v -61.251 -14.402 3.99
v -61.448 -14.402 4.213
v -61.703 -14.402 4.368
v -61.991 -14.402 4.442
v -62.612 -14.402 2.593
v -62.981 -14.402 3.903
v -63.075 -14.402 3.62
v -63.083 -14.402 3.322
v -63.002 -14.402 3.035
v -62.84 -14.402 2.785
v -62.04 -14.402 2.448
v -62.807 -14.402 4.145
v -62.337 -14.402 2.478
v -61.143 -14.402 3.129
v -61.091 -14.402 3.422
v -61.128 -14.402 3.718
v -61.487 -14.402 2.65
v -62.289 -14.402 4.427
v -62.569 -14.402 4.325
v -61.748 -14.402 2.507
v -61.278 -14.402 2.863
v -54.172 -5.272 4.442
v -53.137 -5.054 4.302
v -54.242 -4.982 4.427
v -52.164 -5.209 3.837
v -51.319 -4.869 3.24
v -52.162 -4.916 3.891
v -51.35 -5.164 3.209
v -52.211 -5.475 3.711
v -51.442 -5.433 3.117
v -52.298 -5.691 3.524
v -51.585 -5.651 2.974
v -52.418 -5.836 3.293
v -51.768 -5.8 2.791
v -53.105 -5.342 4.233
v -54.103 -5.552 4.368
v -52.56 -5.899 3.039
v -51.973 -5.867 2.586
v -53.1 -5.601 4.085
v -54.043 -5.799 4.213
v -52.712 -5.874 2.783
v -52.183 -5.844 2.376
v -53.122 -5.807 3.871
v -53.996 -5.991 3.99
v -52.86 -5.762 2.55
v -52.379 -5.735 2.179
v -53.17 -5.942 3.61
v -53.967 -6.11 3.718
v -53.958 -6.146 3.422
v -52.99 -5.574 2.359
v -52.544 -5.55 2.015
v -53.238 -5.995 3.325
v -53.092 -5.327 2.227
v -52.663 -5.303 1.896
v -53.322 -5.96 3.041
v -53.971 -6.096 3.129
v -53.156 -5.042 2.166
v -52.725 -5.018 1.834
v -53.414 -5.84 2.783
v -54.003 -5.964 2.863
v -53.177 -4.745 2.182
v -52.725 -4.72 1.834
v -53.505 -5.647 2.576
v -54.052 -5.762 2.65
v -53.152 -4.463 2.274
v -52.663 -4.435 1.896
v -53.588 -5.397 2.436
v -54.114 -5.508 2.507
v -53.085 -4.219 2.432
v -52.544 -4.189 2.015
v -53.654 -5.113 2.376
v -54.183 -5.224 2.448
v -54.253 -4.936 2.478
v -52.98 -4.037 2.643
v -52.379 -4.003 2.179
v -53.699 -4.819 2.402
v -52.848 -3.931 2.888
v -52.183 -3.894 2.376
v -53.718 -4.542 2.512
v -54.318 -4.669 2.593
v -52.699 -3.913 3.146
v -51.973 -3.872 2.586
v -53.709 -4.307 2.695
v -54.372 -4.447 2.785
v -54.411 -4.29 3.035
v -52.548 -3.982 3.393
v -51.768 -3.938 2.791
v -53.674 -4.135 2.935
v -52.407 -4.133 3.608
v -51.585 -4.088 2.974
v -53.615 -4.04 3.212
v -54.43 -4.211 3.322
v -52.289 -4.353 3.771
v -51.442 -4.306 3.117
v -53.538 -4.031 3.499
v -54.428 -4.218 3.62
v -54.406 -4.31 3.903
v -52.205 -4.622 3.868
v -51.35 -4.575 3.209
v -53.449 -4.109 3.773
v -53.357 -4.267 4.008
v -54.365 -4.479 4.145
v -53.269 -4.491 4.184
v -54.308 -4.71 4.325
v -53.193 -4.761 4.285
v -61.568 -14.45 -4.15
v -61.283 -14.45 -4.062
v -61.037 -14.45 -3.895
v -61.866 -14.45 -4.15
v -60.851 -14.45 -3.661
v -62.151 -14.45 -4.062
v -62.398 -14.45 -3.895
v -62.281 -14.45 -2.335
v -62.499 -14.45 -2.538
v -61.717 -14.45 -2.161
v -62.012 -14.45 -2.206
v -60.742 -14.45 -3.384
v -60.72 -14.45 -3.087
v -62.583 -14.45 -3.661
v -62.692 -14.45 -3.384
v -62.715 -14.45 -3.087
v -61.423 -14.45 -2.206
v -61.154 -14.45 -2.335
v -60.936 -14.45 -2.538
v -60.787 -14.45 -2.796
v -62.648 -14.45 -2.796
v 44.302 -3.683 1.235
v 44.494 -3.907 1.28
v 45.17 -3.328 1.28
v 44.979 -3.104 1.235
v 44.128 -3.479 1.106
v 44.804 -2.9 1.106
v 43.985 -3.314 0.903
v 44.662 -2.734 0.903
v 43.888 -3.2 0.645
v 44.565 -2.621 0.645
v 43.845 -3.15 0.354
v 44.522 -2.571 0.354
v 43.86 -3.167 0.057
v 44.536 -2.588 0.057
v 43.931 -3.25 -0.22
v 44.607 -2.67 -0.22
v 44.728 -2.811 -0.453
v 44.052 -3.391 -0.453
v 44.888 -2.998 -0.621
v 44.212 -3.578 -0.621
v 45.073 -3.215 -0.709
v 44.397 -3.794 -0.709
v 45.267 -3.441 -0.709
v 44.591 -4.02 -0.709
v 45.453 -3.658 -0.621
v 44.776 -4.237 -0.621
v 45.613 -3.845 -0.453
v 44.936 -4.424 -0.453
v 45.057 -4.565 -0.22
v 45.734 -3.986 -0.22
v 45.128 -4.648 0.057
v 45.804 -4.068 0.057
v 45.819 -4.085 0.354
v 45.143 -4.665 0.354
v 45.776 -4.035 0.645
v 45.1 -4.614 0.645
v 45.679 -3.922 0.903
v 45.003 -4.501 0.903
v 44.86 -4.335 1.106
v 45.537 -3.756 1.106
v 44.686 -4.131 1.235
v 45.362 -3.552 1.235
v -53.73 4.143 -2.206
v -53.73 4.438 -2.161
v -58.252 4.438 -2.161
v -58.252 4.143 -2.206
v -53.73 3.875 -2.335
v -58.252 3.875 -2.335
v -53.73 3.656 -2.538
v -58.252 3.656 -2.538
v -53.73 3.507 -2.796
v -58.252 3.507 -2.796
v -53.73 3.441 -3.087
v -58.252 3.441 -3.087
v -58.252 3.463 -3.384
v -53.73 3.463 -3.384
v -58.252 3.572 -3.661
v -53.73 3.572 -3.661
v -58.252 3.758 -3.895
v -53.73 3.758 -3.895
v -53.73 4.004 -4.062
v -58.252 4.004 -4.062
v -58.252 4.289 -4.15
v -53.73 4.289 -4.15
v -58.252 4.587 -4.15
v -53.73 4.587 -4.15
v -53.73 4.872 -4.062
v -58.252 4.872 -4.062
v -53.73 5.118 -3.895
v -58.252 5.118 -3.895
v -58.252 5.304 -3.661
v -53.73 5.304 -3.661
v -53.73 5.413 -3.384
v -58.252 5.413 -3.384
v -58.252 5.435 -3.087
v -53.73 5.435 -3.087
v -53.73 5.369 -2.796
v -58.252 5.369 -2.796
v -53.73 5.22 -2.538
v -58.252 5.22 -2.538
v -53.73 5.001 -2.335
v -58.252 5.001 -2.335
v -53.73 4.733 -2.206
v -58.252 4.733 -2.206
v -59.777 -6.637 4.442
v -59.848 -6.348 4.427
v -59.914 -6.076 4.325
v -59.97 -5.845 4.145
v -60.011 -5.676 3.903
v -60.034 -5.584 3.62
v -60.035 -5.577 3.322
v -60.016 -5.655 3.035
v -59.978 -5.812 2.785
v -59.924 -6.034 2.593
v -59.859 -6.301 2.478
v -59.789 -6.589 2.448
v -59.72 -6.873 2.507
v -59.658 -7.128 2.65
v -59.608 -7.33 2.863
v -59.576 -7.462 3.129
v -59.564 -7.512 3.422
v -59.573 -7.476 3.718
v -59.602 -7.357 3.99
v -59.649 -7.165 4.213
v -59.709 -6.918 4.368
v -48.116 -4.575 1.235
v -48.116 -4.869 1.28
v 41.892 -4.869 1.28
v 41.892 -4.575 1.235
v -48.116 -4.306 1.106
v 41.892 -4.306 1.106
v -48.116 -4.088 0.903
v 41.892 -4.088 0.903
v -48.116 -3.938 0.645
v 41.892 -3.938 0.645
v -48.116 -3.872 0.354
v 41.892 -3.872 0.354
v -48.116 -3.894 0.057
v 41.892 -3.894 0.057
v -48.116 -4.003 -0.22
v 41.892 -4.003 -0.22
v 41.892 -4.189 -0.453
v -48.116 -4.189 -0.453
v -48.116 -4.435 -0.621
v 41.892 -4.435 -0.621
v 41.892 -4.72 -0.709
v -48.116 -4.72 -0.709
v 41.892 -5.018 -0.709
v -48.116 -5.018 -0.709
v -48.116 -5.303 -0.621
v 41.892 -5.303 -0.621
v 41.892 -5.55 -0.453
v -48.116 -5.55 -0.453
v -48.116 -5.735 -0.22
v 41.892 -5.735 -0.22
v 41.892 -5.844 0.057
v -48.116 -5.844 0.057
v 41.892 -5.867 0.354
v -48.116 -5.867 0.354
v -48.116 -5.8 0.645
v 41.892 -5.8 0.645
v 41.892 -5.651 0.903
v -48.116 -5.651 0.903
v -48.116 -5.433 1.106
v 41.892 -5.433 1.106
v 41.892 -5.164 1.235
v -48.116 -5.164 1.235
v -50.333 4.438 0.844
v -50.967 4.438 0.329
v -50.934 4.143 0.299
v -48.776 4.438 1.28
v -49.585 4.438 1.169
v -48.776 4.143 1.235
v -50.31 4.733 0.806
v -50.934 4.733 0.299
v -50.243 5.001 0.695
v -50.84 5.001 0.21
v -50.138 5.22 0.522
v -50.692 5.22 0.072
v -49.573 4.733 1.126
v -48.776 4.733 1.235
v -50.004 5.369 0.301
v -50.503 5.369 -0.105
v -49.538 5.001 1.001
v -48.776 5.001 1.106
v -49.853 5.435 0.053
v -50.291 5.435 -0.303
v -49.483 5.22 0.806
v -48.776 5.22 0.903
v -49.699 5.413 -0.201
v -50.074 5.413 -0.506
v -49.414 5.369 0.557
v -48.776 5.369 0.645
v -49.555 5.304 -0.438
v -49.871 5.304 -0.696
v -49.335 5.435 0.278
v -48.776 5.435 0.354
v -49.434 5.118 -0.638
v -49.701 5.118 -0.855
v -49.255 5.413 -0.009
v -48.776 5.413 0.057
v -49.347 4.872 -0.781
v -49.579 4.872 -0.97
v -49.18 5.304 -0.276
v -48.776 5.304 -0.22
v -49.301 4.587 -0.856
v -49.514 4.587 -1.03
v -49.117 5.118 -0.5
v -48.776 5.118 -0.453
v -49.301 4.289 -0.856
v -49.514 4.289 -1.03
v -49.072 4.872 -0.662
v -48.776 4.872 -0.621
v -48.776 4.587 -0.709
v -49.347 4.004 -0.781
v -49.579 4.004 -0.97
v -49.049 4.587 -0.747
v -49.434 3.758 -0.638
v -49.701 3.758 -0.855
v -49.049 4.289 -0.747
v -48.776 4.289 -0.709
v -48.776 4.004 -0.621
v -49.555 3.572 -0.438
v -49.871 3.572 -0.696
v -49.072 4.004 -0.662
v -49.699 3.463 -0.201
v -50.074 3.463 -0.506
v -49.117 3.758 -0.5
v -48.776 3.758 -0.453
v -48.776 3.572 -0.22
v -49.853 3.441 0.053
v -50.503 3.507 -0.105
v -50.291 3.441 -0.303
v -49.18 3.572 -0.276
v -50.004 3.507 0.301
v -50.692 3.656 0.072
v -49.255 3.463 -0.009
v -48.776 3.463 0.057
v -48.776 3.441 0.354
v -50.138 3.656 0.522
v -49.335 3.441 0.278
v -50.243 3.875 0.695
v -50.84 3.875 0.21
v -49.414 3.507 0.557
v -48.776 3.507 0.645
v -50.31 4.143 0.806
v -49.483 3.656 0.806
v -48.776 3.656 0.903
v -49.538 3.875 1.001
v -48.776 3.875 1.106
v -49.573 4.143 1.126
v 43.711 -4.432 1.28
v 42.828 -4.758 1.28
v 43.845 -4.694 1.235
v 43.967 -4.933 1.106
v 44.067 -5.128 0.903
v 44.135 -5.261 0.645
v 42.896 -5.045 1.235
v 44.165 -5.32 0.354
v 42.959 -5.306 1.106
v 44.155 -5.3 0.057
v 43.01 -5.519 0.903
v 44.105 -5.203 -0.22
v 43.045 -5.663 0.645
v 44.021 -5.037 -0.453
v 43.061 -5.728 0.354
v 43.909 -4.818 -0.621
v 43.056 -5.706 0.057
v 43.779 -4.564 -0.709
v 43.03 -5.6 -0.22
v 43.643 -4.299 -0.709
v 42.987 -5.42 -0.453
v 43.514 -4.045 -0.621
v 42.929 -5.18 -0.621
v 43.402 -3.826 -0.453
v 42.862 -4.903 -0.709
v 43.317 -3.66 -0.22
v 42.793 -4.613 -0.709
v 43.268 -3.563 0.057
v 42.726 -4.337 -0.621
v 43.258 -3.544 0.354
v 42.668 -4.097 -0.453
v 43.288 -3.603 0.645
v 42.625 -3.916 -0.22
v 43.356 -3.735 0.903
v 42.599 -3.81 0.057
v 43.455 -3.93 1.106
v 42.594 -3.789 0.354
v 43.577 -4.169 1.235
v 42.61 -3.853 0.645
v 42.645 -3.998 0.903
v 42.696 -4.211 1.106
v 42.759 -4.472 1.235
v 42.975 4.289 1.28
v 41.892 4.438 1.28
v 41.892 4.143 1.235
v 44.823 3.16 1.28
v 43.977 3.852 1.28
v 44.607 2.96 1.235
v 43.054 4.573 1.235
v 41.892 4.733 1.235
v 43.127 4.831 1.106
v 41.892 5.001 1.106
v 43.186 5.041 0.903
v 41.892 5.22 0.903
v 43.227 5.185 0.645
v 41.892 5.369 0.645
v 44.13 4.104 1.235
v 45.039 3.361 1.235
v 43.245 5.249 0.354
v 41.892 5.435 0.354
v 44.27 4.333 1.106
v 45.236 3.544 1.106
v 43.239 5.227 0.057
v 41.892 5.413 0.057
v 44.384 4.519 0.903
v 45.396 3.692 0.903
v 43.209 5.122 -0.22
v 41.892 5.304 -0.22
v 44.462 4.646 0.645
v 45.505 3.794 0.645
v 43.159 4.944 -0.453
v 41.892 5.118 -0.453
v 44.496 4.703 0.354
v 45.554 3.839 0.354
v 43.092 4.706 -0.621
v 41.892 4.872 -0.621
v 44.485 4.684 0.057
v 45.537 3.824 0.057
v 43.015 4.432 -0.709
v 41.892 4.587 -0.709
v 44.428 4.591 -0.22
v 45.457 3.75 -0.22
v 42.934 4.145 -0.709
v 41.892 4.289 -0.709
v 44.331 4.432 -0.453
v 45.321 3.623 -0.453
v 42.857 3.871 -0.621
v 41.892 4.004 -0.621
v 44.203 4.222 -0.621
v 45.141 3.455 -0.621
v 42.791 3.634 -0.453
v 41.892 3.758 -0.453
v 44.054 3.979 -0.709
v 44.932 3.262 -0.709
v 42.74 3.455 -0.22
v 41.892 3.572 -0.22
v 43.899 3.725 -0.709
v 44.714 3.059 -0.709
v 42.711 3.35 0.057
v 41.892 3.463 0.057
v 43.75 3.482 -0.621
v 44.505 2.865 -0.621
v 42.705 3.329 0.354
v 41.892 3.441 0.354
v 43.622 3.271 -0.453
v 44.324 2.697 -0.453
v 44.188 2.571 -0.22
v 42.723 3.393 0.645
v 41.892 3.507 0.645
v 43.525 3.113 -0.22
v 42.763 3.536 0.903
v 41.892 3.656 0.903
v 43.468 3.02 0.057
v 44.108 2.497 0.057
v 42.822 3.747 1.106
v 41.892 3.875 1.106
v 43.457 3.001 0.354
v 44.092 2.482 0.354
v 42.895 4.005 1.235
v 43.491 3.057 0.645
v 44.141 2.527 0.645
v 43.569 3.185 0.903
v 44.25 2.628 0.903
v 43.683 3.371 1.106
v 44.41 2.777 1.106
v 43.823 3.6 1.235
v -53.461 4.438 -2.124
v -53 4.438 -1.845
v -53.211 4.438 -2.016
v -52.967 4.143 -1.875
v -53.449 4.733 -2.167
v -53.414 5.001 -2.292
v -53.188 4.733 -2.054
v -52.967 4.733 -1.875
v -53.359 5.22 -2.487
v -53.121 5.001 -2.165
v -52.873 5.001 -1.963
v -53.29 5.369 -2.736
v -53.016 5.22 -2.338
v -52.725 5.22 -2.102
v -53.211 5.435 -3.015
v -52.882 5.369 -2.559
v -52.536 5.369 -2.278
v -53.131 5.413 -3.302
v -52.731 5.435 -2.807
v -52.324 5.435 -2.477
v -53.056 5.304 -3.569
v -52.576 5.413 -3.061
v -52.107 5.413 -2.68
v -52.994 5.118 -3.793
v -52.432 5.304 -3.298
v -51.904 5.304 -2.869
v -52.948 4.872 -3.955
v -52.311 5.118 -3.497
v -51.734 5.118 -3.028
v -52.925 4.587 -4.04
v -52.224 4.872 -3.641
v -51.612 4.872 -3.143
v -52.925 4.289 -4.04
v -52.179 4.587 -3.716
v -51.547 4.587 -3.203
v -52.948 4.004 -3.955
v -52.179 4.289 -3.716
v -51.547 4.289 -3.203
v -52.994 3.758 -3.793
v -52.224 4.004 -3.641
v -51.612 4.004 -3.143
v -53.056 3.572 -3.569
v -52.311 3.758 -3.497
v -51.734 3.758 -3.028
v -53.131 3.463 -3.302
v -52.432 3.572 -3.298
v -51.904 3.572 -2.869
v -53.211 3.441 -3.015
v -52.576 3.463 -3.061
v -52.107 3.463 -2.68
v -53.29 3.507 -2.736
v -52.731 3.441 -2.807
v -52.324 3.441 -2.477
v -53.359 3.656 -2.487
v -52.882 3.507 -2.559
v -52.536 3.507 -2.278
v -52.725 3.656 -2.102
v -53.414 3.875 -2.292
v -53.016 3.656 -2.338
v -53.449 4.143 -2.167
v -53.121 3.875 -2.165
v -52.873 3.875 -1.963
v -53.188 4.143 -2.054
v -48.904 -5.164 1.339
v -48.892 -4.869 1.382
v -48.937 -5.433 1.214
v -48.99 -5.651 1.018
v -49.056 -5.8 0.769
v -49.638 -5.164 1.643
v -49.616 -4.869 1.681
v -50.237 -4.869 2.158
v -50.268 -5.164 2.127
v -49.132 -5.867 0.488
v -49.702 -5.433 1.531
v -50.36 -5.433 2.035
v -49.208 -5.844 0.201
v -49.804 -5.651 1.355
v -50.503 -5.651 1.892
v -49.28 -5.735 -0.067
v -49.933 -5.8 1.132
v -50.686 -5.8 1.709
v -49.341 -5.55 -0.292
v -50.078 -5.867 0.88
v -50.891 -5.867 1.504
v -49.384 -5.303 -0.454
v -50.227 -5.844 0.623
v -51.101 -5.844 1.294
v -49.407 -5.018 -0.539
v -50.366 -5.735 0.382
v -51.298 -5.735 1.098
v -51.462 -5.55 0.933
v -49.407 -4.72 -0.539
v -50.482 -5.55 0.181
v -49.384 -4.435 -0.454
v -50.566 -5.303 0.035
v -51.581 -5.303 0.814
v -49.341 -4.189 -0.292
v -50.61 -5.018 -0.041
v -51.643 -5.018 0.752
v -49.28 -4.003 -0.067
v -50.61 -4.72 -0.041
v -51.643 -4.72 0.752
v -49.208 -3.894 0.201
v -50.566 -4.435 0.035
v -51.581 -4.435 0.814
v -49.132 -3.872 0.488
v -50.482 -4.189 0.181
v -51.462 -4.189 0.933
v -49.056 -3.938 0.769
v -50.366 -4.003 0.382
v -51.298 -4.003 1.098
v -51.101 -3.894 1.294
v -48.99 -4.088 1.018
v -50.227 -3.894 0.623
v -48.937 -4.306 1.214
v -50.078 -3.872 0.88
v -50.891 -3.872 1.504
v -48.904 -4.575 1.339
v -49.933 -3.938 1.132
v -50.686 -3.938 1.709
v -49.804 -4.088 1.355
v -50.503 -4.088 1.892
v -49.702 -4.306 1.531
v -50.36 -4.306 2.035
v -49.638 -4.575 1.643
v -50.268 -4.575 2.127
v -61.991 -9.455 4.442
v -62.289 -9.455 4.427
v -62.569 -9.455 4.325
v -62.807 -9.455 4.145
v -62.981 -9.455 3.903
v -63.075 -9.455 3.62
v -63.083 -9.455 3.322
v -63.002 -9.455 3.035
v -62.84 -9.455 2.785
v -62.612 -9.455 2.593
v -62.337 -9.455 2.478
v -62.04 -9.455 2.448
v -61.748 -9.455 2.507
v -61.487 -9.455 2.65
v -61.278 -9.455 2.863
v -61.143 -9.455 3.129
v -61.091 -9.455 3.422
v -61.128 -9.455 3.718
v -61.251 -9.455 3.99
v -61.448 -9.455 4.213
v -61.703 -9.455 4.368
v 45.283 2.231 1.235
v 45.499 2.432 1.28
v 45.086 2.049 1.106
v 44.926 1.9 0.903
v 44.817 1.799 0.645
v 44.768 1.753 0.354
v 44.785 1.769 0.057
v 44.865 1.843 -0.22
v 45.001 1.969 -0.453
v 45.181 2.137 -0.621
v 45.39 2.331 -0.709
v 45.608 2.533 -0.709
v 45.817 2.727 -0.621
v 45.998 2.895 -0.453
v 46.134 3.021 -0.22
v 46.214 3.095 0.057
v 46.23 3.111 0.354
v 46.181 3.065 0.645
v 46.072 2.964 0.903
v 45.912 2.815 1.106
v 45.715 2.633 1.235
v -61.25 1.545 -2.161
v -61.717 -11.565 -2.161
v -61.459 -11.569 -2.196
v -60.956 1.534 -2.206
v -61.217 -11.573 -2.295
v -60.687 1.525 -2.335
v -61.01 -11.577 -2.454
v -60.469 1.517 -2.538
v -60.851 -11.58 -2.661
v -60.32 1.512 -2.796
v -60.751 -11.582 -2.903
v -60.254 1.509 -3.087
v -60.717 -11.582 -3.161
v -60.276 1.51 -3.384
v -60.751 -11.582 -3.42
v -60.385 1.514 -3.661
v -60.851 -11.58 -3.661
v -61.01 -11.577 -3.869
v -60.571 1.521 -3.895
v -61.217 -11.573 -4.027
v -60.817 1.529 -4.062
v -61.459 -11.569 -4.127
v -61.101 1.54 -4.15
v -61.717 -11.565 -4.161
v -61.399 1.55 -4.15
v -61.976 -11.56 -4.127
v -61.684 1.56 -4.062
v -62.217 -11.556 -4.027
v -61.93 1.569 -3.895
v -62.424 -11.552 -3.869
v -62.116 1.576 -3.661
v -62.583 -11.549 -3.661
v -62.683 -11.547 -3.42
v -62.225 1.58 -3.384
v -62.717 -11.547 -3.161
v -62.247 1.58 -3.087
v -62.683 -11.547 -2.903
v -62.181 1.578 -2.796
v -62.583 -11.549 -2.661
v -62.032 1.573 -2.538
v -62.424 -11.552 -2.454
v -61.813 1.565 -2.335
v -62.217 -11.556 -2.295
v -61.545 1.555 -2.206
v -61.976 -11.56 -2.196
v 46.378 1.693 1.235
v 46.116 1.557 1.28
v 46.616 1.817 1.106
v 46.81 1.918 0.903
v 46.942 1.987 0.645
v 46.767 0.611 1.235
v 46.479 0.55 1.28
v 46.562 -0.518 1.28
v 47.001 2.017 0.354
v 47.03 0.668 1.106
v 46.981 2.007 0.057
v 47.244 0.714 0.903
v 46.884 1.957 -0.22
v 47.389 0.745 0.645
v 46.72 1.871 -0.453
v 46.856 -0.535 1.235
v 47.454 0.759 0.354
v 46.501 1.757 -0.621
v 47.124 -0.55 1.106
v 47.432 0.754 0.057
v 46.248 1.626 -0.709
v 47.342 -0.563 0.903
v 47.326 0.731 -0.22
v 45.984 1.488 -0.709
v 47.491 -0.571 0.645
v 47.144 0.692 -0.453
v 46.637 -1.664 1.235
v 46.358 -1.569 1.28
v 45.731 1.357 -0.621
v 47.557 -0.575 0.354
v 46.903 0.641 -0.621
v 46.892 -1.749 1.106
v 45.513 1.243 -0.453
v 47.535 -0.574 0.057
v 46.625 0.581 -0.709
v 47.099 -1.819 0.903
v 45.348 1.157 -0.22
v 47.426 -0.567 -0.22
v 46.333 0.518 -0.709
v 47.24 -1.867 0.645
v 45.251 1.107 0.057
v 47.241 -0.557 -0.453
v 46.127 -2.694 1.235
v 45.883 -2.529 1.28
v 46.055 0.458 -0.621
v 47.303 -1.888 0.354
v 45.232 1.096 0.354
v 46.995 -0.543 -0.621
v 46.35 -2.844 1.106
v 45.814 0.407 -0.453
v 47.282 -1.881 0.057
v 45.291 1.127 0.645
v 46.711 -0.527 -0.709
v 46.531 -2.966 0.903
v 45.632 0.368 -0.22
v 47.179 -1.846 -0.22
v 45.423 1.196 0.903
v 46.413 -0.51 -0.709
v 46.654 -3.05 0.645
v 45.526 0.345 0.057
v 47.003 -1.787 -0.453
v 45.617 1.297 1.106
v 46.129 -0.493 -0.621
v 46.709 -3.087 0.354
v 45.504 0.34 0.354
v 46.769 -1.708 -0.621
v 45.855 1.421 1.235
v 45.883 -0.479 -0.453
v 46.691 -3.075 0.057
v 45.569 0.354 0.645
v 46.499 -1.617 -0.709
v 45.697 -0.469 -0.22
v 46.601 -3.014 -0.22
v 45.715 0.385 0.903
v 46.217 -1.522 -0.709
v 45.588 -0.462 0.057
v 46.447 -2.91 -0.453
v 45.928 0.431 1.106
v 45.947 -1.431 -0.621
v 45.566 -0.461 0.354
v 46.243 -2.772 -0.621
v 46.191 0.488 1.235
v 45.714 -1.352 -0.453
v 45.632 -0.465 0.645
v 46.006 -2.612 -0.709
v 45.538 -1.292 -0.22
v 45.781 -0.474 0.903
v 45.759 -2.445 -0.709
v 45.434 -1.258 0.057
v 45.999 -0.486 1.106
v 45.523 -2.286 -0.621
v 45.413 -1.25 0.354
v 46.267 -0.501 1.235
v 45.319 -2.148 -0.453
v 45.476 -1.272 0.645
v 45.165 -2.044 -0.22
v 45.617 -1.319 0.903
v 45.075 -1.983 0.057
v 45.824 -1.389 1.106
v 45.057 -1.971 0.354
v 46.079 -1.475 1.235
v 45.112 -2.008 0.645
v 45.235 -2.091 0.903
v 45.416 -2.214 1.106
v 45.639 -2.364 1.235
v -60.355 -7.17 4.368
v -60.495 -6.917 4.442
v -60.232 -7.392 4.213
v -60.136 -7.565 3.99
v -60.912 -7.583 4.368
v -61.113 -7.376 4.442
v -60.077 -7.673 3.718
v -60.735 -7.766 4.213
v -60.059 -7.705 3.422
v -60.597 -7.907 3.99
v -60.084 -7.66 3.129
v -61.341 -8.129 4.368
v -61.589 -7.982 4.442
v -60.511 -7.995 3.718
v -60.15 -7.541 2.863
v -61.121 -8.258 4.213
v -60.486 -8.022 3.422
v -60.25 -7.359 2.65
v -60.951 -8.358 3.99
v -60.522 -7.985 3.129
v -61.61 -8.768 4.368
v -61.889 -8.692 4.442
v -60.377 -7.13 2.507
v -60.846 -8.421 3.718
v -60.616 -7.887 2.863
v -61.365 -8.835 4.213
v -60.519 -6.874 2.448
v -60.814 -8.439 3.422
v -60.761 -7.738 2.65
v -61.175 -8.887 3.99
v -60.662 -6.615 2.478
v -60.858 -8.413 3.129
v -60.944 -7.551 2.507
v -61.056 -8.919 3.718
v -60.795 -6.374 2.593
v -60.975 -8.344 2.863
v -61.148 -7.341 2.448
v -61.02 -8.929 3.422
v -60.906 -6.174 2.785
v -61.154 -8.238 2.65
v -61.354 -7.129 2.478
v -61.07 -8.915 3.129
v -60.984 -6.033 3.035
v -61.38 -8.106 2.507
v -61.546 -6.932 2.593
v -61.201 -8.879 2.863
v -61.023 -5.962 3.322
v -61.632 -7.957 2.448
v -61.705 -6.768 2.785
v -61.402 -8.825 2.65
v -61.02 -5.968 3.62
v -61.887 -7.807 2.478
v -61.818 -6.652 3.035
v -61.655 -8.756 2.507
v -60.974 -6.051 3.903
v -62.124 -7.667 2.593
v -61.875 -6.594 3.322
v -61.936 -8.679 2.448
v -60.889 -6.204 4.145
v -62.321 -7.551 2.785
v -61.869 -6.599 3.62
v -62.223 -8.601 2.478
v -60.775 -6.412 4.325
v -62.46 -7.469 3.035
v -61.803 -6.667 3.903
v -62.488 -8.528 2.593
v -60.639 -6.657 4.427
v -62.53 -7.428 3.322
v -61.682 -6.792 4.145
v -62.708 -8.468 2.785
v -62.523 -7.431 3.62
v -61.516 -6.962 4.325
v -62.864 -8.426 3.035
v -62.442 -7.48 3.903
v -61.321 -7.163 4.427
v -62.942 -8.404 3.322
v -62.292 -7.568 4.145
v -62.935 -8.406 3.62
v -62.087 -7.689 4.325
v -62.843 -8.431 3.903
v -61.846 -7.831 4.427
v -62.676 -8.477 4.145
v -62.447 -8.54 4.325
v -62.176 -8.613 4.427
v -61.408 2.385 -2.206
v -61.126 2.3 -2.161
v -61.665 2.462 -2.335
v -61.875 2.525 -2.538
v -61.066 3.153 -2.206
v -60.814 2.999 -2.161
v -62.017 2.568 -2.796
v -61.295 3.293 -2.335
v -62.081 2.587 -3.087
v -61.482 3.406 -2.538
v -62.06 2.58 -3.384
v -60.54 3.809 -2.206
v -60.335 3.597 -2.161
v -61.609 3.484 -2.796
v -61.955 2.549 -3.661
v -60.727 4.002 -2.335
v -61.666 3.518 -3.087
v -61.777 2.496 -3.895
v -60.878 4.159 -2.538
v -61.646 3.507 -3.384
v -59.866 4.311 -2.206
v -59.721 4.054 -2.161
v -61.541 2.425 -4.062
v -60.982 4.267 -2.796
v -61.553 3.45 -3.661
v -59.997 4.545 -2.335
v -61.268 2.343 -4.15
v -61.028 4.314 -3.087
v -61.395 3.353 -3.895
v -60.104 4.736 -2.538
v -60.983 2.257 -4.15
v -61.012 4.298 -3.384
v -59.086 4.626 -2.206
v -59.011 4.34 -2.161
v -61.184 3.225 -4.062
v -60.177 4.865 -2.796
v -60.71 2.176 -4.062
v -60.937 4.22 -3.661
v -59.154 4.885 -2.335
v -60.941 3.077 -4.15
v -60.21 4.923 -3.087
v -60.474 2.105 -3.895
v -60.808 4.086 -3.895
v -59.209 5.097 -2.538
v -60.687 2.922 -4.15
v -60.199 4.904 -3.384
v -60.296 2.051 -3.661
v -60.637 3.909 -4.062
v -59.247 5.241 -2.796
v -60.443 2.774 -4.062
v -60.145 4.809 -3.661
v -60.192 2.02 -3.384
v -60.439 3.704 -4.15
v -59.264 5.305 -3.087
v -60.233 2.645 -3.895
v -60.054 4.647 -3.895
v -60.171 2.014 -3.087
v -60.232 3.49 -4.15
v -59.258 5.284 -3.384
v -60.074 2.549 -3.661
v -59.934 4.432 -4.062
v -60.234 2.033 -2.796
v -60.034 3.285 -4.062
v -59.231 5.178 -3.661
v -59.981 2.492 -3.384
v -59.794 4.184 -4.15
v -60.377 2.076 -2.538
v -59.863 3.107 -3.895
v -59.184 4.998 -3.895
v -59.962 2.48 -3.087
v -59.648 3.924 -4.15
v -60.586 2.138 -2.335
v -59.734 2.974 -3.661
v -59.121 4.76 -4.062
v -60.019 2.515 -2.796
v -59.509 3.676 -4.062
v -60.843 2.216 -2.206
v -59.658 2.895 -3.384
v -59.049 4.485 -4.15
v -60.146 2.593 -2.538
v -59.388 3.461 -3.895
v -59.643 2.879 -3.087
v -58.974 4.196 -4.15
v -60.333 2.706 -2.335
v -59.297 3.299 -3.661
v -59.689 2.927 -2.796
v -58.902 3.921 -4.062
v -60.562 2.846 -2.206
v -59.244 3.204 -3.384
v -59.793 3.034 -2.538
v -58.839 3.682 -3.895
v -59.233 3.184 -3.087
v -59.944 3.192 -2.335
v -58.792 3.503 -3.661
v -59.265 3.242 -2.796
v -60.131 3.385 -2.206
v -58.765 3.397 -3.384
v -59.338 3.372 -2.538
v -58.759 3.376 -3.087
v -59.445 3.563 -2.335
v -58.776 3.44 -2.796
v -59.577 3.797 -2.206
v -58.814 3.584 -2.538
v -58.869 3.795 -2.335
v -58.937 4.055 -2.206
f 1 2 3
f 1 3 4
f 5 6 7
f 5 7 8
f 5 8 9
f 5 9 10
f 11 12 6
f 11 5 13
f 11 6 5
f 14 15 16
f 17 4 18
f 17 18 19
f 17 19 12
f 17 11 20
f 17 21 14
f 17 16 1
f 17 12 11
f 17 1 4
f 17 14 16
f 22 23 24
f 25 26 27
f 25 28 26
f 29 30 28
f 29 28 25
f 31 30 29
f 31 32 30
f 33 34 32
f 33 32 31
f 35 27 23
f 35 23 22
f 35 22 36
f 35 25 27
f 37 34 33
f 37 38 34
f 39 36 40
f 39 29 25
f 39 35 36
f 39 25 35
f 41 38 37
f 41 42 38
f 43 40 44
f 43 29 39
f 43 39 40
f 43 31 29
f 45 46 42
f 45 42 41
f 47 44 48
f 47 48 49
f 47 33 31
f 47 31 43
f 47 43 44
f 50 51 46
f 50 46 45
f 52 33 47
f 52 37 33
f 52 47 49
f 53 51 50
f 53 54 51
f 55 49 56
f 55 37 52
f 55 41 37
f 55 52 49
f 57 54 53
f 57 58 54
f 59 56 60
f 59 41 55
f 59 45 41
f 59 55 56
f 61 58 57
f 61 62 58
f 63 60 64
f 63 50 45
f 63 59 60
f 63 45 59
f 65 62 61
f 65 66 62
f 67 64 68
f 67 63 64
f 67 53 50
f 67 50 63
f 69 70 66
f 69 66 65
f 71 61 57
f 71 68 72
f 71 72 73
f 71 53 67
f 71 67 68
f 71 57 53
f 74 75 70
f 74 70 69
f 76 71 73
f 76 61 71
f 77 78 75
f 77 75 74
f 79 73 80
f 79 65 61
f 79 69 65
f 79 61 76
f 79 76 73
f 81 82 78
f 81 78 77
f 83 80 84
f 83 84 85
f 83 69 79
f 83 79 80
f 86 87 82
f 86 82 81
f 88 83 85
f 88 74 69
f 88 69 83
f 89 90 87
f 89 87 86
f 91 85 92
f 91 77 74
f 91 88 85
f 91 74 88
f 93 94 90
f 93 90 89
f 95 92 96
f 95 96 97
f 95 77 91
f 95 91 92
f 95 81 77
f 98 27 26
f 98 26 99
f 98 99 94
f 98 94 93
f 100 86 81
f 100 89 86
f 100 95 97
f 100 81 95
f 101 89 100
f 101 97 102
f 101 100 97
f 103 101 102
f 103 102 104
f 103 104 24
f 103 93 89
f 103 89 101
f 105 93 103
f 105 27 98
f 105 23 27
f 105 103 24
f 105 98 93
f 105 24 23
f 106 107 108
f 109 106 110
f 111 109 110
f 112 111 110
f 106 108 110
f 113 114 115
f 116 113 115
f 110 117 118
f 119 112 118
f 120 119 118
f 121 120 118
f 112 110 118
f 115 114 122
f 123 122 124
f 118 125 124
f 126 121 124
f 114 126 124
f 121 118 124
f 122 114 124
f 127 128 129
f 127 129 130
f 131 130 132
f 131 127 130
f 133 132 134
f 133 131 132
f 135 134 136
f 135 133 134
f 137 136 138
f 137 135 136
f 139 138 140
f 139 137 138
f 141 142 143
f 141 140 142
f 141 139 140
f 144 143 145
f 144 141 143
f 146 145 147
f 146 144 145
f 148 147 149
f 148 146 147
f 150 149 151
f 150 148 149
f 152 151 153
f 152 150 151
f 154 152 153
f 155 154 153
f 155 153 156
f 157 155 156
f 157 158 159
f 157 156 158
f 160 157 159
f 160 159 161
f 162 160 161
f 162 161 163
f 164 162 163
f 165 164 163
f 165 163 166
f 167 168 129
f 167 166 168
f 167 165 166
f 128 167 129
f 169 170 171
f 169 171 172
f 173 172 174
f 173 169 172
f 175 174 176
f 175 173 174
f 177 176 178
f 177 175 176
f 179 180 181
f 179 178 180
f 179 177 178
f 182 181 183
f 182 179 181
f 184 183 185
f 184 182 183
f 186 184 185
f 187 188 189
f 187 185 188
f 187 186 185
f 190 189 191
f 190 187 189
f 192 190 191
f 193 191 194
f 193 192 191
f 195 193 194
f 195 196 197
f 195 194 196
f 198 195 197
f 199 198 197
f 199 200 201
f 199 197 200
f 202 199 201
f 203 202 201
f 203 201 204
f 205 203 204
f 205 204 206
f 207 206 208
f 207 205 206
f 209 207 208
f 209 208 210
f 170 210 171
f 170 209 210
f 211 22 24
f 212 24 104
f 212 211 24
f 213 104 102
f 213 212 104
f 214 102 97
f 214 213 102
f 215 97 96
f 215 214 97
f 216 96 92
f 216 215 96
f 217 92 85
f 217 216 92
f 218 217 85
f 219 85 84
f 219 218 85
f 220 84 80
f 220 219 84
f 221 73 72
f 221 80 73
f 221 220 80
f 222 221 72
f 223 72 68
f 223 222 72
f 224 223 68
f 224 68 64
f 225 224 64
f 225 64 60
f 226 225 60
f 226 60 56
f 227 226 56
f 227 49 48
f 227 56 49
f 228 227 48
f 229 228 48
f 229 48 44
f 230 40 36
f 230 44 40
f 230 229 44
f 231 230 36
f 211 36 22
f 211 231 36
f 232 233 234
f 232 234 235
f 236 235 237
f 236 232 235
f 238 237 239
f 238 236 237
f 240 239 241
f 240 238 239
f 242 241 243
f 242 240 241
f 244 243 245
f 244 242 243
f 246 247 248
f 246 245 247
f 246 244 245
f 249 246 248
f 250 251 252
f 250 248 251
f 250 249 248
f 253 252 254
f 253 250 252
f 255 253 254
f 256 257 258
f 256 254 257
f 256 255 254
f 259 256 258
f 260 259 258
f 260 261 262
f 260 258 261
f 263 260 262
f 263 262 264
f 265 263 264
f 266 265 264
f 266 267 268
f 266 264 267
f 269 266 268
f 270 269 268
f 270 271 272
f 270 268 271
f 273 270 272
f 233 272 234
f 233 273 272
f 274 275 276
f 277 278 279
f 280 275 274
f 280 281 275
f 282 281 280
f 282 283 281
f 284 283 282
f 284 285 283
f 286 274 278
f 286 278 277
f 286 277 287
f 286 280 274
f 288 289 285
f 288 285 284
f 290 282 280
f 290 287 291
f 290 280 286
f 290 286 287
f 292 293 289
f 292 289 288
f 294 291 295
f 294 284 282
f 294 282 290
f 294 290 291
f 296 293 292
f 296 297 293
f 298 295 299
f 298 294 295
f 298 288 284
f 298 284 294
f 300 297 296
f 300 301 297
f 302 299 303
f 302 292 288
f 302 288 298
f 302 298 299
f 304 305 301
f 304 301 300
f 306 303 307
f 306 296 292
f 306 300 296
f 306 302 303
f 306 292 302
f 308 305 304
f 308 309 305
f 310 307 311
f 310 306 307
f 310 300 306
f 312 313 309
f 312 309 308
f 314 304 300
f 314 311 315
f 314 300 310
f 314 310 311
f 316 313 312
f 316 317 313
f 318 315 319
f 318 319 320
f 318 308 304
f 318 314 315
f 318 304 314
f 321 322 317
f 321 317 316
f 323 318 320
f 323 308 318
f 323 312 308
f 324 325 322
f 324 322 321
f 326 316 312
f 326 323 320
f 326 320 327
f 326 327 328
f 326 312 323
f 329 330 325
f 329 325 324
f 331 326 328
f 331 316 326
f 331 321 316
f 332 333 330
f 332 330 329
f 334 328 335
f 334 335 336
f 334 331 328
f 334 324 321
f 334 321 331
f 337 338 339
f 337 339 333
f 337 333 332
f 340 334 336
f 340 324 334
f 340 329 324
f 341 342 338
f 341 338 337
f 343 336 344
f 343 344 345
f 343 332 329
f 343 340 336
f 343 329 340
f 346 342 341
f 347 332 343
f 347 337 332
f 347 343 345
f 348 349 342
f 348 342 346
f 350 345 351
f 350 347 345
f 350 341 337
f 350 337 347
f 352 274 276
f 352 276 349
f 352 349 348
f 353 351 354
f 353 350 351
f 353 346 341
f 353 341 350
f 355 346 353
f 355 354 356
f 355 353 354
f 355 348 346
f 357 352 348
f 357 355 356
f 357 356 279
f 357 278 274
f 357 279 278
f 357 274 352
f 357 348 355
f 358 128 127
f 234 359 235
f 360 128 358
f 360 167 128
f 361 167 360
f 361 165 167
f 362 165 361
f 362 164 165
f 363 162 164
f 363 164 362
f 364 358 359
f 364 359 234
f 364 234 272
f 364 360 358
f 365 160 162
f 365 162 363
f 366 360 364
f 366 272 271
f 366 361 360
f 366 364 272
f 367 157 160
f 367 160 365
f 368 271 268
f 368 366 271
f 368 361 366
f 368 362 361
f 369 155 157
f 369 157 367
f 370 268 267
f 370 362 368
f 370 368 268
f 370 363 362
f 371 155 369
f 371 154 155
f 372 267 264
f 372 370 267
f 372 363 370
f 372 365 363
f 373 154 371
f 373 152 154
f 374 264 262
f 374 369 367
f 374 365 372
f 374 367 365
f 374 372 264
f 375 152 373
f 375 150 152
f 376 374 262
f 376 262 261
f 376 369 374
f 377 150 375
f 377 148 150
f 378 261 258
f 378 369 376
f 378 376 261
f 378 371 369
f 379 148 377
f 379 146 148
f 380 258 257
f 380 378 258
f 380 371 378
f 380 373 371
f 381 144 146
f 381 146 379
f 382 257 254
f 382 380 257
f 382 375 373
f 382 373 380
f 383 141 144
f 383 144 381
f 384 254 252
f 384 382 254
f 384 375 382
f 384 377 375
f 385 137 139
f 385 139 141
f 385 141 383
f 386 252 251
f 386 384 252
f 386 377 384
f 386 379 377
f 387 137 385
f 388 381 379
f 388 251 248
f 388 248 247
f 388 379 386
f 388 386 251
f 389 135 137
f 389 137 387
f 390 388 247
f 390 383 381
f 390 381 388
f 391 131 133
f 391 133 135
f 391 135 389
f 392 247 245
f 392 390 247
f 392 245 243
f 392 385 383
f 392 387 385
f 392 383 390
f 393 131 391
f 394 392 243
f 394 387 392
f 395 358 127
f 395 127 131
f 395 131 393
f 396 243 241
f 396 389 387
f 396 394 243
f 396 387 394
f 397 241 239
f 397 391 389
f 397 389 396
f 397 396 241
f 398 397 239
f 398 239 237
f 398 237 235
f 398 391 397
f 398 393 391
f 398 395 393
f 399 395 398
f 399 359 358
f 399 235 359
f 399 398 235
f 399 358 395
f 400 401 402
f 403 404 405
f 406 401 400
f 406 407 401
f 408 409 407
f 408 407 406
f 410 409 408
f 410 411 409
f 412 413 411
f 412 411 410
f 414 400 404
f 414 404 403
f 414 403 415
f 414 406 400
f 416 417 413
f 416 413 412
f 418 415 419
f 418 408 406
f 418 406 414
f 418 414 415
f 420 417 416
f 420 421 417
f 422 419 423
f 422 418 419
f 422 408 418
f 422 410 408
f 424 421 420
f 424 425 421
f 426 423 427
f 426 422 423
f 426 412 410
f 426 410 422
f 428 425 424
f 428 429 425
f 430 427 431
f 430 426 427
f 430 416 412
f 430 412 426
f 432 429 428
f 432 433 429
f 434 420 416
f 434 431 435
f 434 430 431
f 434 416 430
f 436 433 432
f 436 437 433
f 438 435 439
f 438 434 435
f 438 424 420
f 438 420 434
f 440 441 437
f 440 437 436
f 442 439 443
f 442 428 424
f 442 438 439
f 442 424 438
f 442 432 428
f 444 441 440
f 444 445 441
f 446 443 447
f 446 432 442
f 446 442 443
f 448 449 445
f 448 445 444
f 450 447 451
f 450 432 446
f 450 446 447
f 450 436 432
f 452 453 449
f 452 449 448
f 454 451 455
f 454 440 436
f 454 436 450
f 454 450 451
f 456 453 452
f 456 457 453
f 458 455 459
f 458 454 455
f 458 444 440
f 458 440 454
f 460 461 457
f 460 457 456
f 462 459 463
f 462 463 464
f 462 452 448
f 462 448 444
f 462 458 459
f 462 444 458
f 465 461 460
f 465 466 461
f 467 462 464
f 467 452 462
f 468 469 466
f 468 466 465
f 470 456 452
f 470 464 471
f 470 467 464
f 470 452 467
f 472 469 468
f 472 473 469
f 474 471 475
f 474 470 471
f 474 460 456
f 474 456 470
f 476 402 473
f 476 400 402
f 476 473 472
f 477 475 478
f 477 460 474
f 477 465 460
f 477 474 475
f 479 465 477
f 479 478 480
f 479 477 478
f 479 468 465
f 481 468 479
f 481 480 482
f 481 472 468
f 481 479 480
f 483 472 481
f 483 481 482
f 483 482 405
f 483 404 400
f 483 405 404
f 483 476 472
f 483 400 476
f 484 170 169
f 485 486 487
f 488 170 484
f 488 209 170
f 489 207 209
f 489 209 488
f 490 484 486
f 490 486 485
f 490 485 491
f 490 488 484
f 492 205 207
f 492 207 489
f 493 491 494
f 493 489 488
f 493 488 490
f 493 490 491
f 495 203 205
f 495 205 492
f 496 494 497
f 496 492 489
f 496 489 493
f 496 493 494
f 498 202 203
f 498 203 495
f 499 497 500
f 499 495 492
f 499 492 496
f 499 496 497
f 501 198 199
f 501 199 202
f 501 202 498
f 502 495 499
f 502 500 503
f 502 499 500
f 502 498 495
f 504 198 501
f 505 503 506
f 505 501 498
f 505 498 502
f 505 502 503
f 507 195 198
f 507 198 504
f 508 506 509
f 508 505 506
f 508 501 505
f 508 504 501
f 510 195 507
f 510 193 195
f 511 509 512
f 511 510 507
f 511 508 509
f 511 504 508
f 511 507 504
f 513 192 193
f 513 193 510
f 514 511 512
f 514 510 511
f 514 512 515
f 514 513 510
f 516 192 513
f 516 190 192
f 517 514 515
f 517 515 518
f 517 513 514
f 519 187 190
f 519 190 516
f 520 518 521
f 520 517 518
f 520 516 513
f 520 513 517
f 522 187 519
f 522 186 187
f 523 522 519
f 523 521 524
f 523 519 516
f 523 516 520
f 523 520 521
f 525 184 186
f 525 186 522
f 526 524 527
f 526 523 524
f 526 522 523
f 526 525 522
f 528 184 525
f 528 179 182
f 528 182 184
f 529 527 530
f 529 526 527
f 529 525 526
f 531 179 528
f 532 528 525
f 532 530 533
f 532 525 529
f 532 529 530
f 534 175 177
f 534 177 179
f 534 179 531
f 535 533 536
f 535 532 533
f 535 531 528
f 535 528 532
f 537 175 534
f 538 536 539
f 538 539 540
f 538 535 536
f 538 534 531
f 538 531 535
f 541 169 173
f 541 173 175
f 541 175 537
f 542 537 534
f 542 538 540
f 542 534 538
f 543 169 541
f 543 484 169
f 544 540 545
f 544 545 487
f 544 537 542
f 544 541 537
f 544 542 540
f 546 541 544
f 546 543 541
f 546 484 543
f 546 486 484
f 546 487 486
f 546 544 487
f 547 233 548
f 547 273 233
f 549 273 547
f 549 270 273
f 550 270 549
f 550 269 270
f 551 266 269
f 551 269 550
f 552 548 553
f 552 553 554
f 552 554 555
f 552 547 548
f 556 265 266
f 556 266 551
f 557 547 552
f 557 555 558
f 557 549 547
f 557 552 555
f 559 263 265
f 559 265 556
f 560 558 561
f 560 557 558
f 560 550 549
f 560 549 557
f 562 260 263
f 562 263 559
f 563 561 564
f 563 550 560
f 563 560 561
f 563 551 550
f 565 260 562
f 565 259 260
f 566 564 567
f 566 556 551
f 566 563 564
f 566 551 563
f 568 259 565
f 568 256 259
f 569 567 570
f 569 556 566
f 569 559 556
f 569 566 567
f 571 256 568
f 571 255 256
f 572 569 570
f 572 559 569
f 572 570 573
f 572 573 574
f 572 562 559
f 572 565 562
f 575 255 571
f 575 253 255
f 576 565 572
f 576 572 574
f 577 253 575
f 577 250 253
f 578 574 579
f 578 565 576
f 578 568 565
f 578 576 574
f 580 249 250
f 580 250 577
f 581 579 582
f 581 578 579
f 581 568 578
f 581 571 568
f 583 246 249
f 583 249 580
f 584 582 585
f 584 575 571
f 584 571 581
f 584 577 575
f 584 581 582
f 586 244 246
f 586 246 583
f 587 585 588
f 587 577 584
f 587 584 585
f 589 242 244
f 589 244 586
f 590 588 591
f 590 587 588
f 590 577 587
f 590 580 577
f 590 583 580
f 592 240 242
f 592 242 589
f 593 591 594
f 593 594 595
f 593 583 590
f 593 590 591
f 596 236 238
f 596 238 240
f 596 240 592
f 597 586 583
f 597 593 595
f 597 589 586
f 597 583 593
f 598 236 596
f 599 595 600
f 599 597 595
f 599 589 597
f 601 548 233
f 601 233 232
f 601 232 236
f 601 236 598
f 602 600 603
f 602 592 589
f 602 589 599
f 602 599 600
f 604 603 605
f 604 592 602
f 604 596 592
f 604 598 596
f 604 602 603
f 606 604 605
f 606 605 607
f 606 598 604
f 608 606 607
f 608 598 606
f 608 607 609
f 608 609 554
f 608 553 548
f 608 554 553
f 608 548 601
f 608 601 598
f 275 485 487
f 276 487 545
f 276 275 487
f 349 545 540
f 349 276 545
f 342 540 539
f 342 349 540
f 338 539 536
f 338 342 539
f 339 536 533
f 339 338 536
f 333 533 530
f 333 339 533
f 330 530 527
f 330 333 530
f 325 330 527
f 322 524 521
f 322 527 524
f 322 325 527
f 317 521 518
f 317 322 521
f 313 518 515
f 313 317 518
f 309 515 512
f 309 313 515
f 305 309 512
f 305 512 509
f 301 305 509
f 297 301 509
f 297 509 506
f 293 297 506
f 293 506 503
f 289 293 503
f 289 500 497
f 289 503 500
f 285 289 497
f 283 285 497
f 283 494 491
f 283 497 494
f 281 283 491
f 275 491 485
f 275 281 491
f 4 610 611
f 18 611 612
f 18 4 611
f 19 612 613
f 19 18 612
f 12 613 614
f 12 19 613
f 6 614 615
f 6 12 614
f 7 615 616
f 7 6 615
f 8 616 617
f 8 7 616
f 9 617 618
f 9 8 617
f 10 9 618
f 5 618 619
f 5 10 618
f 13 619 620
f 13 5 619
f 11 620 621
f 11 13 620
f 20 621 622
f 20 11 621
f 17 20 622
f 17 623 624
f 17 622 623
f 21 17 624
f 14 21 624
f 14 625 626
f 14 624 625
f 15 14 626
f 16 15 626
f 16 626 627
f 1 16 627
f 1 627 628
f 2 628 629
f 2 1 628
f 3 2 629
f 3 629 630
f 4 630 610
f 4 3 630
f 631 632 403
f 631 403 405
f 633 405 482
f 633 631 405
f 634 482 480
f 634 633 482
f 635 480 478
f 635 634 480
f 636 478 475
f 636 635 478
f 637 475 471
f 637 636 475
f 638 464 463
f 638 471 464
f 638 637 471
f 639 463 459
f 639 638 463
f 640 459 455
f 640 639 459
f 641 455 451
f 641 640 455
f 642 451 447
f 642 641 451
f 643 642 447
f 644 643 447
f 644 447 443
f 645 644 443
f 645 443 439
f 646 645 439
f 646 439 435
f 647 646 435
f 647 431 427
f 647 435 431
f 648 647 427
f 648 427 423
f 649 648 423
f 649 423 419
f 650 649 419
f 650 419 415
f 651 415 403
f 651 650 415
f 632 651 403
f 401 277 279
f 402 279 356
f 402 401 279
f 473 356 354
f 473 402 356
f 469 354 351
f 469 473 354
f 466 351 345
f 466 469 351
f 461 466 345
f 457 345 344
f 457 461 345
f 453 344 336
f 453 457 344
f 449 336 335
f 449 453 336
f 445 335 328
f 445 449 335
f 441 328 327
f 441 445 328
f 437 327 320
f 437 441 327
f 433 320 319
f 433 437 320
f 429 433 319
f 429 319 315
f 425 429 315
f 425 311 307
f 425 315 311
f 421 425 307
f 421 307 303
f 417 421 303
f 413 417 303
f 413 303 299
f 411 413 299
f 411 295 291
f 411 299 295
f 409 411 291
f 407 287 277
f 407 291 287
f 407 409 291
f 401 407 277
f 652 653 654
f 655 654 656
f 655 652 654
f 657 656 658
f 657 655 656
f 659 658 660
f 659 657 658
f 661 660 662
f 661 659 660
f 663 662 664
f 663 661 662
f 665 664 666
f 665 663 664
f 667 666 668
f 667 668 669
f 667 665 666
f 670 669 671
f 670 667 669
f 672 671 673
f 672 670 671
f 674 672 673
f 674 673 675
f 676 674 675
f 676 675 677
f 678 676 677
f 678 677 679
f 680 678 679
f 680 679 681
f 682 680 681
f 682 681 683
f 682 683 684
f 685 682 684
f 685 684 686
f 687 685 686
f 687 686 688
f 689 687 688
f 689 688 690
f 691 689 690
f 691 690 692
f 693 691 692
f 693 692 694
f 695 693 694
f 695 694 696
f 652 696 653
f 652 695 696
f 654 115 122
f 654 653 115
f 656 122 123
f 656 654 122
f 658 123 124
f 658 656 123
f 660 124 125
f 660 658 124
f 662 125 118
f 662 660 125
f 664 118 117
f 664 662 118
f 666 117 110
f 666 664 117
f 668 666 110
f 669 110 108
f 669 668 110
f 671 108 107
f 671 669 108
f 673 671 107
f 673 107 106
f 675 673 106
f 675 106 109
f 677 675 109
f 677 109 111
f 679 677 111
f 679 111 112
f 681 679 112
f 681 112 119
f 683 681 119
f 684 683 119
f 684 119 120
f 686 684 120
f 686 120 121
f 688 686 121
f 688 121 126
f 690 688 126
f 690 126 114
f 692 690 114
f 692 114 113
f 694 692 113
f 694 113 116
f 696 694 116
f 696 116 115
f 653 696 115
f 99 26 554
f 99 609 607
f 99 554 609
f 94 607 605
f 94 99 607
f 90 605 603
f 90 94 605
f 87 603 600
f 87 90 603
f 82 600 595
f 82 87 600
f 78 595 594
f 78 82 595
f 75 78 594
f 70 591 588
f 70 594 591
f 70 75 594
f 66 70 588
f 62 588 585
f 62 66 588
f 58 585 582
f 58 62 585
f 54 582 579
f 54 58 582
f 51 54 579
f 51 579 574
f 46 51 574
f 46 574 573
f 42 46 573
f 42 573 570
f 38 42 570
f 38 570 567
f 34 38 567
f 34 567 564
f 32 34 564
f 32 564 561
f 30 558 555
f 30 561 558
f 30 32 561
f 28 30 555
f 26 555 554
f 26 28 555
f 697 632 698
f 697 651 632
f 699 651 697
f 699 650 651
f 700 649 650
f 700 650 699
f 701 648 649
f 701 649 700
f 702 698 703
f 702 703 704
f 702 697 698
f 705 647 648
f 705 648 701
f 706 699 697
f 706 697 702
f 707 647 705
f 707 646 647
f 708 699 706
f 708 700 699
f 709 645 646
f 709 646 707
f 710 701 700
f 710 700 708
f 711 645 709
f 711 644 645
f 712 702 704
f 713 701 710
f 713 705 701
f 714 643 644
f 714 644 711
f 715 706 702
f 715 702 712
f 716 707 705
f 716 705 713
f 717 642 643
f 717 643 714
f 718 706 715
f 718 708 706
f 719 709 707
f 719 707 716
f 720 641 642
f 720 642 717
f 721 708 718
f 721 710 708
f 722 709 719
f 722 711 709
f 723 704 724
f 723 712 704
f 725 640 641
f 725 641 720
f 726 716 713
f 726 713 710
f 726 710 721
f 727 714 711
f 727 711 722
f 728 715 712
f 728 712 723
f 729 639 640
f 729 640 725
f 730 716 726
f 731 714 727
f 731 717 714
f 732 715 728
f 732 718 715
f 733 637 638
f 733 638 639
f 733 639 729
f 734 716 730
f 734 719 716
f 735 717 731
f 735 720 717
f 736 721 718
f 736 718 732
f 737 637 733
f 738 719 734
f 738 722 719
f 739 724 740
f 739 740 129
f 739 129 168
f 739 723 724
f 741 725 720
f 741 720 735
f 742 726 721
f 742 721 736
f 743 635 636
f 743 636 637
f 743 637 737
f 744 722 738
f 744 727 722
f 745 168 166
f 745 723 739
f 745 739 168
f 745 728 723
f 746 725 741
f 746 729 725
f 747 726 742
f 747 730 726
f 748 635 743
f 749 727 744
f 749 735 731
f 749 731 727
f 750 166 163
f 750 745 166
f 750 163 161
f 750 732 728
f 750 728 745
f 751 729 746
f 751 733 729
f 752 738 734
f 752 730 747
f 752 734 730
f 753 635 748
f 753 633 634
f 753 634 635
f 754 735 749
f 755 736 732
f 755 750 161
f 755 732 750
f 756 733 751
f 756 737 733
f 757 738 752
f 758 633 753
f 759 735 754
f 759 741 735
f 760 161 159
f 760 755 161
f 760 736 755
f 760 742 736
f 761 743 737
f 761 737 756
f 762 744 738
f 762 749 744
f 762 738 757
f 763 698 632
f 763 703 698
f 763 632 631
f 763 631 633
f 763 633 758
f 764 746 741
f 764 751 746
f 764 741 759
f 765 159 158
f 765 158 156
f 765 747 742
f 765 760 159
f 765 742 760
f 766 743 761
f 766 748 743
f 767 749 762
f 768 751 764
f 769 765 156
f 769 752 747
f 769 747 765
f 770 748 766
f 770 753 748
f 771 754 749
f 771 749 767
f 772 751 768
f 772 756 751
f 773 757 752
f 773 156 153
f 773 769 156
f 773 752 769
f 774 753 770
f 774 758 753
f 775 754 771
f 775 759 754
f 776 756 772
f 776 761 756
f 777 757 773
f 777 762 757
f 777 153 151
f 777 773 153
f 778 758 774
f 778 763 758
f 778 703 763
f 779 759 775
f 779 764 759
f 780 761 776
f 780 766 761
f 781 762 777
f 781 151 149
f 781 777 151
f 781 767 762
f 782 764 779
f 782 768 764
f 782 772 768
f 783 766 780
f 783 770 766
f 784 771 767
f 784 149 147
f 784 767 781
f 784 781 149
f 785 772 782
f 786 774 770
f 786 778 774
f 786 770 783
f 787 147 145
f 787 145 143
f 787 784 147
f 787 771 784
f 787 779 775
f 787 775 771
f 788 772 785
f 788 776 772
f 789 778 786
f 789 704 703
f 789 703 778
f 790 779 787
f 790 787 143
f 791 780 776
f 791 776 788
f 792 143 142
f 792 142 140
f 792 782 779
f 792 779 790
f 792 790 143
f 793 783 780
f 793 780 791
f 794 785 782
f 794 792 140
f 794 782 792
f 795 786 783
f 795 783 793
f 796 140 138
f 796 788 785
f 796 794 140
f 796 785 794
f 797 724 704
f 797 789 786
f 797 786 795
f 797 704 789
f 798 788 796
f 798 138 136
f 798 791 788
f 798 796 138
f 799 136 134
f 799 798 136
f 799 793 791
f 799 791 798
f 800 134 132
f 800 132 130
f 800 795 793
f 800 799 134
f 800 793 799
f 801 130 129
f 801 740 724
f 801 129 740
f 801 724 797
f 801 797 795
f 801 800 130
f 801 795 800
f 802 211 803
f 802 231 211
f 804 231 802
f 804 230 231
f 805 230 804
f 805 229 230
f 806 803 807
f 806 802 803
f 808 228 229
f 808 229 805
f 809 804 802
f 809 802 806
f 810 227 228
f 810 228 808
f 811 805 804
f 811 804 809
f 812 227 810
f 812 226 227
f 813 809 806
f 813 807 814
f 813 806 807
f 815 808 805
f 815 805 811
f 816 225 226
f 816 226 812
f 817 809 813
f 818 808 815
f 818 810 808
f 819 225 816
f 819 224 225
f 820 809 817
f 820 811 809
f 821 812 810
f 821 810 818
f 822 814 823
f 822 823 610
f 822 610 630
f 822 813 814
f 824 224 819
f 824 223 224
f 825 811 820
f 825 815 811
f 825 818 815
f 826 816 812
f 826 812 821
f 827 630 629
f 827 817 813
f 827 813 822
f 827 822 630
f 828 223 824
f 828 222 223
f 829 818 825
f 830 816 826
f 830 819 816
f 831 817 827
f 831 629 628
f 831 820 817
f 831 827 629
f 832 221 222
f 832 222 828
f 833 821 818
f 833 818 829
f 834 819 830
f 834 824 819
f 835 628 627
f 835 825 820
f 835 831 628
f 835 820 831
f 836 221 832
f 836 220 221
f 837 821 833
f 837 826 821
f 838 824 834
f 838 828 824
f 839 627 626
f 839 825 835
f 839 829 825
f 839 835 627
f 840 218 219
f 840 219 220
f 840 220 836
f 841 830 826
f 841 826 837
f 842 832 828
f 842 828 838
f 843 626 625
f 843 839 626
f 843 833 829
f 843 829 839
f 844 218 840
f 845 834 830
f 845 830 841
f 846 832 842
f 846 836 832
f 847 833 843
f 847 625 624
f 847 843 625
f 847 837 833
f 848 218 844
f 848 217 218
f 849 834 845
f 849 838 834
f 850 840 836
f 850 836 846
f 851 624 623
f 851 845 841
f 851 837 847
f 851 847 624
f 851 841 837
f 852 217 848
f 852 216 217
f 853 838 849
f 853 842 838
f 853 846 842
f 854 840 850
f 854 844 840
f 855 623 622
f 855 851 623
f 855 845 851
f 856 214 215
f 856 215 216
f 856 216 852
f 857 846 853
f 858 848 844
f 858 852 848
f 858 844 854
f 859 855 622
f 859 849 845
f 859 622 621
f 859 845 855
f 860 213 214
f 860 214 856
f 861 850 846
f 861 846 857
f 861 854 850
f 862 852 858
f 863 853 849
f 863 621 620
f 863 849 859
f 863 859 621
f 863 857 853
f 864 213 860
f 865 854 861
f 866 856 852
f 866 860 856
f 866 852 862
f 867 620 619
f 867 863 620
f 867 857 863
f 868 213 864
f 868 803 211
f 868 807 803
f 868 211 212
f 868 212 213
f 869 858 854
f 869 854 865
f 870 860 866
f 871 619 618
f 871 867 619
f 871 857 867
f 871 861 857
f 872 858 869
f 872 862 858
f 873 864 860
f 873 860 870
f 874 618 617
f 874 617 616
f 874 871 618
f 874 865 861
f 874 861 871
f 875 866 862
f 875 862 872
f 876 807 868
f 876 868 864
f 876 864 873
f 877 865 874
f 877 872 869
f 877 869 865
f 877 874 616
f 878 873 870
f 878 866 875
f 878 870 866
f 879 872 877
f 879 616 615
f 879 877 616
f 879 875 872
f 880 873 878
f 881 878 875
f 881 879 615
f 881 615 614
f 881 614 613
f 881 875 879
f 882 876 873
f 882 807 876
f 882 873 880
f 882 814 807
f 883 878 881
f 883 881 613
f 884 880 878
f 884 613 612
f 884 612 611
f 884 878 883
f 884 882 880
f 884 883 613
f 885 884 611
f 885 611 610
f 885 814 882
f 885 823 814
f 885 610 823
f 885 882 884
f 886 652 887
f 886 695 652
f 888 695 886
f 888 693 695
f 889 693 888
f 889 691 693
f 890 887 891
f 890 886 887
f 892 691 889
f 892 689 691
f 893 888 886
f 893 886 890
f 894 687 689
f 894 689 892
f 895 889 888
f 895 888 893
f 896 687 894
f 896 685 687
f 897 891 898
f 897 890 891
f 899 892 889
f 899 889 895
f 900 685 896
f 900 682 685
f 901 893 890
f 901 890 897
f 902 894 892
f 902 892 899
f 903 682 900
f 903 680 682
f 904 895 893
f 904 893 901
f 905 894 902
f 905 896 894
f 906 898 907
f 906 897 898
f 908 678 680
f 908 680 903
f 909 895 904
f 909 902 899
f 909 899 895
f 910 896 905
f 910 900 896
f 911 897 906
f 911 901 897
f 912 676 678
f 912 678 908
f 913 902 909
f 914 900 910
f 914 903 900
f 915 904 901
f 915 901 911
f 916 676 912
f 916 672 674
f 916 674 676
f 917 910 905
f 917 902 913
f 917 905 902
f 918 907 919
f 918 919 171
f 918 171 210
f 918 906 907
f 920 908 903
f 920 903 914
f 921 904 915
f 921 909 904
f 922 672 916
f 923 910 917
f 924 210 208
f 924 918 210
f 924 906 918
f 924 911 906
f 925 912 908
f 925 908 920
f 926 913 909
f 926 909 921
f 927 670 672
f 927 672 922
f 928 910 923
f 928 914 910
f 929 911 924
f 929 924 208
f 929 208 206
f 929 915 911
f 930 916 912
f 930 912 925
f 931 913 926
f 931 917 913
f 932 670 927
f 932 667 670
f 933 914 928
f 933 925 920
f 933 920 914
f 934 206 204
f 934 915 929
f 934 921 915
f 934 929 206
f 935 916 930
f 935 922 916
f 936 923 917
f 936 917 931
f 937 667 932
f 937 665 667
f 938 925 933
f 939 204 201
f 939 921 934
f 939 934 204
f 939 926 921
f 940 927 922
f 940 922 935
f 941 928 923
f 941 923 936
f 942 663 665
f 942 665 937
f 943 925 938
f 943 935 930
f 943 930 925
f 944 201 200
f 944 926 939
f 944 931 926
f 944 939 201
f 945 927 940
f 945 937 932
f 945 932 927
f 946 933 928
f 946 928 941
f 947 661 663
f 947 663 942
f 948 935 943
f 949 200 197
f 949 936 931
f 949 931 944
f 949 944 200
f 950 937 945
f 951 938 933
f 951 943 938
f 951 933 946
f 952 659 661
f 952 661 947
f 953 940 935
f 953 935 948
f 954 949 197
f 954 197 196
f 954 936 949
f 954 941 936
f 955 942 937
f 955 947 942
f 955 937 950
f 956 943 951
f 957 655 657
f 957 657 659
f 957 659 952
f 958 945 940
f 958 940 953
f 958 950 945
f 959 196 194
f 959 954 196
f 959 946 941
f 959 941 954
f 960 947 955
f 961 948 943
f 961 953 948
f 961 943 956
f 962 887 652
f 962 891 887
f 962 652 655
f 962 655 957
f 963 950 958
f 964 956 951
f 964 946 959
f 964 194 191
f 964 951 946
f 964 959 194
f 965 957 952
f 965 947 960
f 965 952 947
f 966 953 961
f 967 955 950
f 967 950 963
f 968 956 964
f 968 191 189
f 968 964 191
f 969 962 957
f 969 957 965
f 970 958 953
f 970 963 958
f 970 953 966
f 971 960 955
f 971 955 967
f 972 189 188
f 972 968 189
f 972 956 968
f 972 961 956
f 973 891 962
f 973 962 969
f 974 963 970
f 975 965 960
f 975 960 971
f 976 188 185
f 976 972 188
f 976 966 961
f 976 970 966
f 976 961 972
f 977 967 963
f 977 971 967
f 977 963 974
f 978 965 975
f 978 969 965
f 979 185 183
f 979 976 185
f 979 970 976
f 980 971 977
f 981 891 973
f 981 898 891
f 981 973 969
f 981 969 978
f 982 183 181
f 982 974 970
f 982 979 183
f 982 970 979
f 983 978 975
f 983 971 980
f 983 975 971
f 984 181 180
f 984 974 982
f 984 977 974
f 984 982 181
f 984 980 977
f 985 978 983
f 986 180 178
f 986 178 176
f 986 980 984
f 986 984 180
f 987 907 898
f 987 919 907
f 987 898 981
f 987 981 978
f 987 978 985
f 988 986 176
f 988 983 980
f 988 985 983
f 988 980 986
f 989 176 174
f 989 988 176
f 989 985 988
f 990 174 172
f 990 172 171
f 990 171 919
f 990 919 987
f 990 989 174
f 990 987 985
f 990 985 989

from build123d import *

# Parameters (mm, degrees)
SWEEP1_PROFILE_R = 1


with BuildPart() as part:
    # Sweep1: sweep along a curve in space
    with BuildLine() as sweep1_path:
        Line((-62.090612365, -10.590919014, 3.446712504), (-62.090612365, -14.401731911, 3.446712504))
        Line((-62.090612365, -9.4553548, 3.446712504), (-62.090612365, -10.590919014, 3.446712504))
        ThreePointArc((-62.090612365, -9.4553548, 3.446712504), (-61.449636995, -7.601978747, 3.446712504), (-59.800610502, -6.540581628, 3.446712504))
        Line((-54.195074798, -5.175151224, 3.446712504), (-59.800610502, -6.540581628, 3.446712504))
        ThreePointArc((-52.025907271, -4.86933782, 2.533008422), (-53.028684132, -4.949042, 3.208573711), (-54.195074798, -5.175151224, 3.446712504))
        Line((-52.025907271, -4.86933782, 2.533008422), (-50.944041501, -4.86933782, 1.451142652))
        ThreePointArc((-50.944041501, -4.86933782, 1.451142652), (-49.646348105, -4.86933782, 0.584051647), (-48.115614376, -4.86933782, 0.279569777))
        Line((-48.115614376, -4.86933782, 0.279569777), (41.891910563, -4.86933782, 0.279569777))
        ThreePointArc((41.891910563, -4.86933782, 0.279569777), (43.279021203, -4.621127269, 0.279569777), (44.493984095, -3.907299856, 0.279569777))
        Line((44.493984095, -3.907299856, 0.279569777), (45.170290578, -3.328030209, 0.279569777))
        ThreePointArc((45.170290578, -3.328030209, 0.279569777), (46.561713678, -0.518069604, 0.279569777), (45.49914886, 2.431996981, 0.279569777))
        Line((45.49914886, 2.431996981, 0.279569777), (44.822842377, 3.160197107, 0.279569777))
        ThreePointArc((41.891910563, 4.438131953, 0.279569777), (43.490619321, 4.104755782, 0.279569777), (44.822842377, 3.160197107, 0.279569777))
        Line((41.891910563, 4.438131953, 0.279569777), (-48.775947923, 4.438131953, 0.279569777))
        ThreePointArc((-48.775947923, 4.438131953, 0.279569777), (-49.572047381, 4.438131953, 0.114297455), (-50.236573634, 4.438131953, -0.35420457))
        Line((-50.236573634, 4.438131953, -0.35420457), (-52.269592885, 4.438131953, -2.527696321))
        ThreePointArc((-53.730218595, 4.438131953, -3.161470668), (-52.934119137, 4.438131953, -2.996198346), (-52.269592885, 4.438131953, -2.527696321))
        Line((-53.730218595, 4.438131953, -3.161470668), (-58.252246271, 4.438131953, -3.161470668))
        ThreePointArc((-61.250344312, 1.544940827, -3.161470668), (-60.33546174, 3.596884674, -3.161470668), (-58.252246271, 4.438131953, -3.161470668))
        Line((-61.250344312, 1.544940827, -3.161470668), (-61.717378375, -11.56458697, -3.161470668))
        Line((-61.717378375, -11.56458697, -3.161470668), (-61.717378375, -14.449513465, -3.161470668))
    # Sweep1 profile (on start of the path) → Sweep1 (sweep)
    with BuildSketch(Plane(origin=(-61.717378375, -14.449513465, -3.161470668), x_dir=(0, 0, 1), z_dir=(0, 1, 0))):
        Circle(SWEEP1_PROFILE_R)
    sweep(path=sweep1_path.line, transition=Transition.RIGHT)


solid = part.part
